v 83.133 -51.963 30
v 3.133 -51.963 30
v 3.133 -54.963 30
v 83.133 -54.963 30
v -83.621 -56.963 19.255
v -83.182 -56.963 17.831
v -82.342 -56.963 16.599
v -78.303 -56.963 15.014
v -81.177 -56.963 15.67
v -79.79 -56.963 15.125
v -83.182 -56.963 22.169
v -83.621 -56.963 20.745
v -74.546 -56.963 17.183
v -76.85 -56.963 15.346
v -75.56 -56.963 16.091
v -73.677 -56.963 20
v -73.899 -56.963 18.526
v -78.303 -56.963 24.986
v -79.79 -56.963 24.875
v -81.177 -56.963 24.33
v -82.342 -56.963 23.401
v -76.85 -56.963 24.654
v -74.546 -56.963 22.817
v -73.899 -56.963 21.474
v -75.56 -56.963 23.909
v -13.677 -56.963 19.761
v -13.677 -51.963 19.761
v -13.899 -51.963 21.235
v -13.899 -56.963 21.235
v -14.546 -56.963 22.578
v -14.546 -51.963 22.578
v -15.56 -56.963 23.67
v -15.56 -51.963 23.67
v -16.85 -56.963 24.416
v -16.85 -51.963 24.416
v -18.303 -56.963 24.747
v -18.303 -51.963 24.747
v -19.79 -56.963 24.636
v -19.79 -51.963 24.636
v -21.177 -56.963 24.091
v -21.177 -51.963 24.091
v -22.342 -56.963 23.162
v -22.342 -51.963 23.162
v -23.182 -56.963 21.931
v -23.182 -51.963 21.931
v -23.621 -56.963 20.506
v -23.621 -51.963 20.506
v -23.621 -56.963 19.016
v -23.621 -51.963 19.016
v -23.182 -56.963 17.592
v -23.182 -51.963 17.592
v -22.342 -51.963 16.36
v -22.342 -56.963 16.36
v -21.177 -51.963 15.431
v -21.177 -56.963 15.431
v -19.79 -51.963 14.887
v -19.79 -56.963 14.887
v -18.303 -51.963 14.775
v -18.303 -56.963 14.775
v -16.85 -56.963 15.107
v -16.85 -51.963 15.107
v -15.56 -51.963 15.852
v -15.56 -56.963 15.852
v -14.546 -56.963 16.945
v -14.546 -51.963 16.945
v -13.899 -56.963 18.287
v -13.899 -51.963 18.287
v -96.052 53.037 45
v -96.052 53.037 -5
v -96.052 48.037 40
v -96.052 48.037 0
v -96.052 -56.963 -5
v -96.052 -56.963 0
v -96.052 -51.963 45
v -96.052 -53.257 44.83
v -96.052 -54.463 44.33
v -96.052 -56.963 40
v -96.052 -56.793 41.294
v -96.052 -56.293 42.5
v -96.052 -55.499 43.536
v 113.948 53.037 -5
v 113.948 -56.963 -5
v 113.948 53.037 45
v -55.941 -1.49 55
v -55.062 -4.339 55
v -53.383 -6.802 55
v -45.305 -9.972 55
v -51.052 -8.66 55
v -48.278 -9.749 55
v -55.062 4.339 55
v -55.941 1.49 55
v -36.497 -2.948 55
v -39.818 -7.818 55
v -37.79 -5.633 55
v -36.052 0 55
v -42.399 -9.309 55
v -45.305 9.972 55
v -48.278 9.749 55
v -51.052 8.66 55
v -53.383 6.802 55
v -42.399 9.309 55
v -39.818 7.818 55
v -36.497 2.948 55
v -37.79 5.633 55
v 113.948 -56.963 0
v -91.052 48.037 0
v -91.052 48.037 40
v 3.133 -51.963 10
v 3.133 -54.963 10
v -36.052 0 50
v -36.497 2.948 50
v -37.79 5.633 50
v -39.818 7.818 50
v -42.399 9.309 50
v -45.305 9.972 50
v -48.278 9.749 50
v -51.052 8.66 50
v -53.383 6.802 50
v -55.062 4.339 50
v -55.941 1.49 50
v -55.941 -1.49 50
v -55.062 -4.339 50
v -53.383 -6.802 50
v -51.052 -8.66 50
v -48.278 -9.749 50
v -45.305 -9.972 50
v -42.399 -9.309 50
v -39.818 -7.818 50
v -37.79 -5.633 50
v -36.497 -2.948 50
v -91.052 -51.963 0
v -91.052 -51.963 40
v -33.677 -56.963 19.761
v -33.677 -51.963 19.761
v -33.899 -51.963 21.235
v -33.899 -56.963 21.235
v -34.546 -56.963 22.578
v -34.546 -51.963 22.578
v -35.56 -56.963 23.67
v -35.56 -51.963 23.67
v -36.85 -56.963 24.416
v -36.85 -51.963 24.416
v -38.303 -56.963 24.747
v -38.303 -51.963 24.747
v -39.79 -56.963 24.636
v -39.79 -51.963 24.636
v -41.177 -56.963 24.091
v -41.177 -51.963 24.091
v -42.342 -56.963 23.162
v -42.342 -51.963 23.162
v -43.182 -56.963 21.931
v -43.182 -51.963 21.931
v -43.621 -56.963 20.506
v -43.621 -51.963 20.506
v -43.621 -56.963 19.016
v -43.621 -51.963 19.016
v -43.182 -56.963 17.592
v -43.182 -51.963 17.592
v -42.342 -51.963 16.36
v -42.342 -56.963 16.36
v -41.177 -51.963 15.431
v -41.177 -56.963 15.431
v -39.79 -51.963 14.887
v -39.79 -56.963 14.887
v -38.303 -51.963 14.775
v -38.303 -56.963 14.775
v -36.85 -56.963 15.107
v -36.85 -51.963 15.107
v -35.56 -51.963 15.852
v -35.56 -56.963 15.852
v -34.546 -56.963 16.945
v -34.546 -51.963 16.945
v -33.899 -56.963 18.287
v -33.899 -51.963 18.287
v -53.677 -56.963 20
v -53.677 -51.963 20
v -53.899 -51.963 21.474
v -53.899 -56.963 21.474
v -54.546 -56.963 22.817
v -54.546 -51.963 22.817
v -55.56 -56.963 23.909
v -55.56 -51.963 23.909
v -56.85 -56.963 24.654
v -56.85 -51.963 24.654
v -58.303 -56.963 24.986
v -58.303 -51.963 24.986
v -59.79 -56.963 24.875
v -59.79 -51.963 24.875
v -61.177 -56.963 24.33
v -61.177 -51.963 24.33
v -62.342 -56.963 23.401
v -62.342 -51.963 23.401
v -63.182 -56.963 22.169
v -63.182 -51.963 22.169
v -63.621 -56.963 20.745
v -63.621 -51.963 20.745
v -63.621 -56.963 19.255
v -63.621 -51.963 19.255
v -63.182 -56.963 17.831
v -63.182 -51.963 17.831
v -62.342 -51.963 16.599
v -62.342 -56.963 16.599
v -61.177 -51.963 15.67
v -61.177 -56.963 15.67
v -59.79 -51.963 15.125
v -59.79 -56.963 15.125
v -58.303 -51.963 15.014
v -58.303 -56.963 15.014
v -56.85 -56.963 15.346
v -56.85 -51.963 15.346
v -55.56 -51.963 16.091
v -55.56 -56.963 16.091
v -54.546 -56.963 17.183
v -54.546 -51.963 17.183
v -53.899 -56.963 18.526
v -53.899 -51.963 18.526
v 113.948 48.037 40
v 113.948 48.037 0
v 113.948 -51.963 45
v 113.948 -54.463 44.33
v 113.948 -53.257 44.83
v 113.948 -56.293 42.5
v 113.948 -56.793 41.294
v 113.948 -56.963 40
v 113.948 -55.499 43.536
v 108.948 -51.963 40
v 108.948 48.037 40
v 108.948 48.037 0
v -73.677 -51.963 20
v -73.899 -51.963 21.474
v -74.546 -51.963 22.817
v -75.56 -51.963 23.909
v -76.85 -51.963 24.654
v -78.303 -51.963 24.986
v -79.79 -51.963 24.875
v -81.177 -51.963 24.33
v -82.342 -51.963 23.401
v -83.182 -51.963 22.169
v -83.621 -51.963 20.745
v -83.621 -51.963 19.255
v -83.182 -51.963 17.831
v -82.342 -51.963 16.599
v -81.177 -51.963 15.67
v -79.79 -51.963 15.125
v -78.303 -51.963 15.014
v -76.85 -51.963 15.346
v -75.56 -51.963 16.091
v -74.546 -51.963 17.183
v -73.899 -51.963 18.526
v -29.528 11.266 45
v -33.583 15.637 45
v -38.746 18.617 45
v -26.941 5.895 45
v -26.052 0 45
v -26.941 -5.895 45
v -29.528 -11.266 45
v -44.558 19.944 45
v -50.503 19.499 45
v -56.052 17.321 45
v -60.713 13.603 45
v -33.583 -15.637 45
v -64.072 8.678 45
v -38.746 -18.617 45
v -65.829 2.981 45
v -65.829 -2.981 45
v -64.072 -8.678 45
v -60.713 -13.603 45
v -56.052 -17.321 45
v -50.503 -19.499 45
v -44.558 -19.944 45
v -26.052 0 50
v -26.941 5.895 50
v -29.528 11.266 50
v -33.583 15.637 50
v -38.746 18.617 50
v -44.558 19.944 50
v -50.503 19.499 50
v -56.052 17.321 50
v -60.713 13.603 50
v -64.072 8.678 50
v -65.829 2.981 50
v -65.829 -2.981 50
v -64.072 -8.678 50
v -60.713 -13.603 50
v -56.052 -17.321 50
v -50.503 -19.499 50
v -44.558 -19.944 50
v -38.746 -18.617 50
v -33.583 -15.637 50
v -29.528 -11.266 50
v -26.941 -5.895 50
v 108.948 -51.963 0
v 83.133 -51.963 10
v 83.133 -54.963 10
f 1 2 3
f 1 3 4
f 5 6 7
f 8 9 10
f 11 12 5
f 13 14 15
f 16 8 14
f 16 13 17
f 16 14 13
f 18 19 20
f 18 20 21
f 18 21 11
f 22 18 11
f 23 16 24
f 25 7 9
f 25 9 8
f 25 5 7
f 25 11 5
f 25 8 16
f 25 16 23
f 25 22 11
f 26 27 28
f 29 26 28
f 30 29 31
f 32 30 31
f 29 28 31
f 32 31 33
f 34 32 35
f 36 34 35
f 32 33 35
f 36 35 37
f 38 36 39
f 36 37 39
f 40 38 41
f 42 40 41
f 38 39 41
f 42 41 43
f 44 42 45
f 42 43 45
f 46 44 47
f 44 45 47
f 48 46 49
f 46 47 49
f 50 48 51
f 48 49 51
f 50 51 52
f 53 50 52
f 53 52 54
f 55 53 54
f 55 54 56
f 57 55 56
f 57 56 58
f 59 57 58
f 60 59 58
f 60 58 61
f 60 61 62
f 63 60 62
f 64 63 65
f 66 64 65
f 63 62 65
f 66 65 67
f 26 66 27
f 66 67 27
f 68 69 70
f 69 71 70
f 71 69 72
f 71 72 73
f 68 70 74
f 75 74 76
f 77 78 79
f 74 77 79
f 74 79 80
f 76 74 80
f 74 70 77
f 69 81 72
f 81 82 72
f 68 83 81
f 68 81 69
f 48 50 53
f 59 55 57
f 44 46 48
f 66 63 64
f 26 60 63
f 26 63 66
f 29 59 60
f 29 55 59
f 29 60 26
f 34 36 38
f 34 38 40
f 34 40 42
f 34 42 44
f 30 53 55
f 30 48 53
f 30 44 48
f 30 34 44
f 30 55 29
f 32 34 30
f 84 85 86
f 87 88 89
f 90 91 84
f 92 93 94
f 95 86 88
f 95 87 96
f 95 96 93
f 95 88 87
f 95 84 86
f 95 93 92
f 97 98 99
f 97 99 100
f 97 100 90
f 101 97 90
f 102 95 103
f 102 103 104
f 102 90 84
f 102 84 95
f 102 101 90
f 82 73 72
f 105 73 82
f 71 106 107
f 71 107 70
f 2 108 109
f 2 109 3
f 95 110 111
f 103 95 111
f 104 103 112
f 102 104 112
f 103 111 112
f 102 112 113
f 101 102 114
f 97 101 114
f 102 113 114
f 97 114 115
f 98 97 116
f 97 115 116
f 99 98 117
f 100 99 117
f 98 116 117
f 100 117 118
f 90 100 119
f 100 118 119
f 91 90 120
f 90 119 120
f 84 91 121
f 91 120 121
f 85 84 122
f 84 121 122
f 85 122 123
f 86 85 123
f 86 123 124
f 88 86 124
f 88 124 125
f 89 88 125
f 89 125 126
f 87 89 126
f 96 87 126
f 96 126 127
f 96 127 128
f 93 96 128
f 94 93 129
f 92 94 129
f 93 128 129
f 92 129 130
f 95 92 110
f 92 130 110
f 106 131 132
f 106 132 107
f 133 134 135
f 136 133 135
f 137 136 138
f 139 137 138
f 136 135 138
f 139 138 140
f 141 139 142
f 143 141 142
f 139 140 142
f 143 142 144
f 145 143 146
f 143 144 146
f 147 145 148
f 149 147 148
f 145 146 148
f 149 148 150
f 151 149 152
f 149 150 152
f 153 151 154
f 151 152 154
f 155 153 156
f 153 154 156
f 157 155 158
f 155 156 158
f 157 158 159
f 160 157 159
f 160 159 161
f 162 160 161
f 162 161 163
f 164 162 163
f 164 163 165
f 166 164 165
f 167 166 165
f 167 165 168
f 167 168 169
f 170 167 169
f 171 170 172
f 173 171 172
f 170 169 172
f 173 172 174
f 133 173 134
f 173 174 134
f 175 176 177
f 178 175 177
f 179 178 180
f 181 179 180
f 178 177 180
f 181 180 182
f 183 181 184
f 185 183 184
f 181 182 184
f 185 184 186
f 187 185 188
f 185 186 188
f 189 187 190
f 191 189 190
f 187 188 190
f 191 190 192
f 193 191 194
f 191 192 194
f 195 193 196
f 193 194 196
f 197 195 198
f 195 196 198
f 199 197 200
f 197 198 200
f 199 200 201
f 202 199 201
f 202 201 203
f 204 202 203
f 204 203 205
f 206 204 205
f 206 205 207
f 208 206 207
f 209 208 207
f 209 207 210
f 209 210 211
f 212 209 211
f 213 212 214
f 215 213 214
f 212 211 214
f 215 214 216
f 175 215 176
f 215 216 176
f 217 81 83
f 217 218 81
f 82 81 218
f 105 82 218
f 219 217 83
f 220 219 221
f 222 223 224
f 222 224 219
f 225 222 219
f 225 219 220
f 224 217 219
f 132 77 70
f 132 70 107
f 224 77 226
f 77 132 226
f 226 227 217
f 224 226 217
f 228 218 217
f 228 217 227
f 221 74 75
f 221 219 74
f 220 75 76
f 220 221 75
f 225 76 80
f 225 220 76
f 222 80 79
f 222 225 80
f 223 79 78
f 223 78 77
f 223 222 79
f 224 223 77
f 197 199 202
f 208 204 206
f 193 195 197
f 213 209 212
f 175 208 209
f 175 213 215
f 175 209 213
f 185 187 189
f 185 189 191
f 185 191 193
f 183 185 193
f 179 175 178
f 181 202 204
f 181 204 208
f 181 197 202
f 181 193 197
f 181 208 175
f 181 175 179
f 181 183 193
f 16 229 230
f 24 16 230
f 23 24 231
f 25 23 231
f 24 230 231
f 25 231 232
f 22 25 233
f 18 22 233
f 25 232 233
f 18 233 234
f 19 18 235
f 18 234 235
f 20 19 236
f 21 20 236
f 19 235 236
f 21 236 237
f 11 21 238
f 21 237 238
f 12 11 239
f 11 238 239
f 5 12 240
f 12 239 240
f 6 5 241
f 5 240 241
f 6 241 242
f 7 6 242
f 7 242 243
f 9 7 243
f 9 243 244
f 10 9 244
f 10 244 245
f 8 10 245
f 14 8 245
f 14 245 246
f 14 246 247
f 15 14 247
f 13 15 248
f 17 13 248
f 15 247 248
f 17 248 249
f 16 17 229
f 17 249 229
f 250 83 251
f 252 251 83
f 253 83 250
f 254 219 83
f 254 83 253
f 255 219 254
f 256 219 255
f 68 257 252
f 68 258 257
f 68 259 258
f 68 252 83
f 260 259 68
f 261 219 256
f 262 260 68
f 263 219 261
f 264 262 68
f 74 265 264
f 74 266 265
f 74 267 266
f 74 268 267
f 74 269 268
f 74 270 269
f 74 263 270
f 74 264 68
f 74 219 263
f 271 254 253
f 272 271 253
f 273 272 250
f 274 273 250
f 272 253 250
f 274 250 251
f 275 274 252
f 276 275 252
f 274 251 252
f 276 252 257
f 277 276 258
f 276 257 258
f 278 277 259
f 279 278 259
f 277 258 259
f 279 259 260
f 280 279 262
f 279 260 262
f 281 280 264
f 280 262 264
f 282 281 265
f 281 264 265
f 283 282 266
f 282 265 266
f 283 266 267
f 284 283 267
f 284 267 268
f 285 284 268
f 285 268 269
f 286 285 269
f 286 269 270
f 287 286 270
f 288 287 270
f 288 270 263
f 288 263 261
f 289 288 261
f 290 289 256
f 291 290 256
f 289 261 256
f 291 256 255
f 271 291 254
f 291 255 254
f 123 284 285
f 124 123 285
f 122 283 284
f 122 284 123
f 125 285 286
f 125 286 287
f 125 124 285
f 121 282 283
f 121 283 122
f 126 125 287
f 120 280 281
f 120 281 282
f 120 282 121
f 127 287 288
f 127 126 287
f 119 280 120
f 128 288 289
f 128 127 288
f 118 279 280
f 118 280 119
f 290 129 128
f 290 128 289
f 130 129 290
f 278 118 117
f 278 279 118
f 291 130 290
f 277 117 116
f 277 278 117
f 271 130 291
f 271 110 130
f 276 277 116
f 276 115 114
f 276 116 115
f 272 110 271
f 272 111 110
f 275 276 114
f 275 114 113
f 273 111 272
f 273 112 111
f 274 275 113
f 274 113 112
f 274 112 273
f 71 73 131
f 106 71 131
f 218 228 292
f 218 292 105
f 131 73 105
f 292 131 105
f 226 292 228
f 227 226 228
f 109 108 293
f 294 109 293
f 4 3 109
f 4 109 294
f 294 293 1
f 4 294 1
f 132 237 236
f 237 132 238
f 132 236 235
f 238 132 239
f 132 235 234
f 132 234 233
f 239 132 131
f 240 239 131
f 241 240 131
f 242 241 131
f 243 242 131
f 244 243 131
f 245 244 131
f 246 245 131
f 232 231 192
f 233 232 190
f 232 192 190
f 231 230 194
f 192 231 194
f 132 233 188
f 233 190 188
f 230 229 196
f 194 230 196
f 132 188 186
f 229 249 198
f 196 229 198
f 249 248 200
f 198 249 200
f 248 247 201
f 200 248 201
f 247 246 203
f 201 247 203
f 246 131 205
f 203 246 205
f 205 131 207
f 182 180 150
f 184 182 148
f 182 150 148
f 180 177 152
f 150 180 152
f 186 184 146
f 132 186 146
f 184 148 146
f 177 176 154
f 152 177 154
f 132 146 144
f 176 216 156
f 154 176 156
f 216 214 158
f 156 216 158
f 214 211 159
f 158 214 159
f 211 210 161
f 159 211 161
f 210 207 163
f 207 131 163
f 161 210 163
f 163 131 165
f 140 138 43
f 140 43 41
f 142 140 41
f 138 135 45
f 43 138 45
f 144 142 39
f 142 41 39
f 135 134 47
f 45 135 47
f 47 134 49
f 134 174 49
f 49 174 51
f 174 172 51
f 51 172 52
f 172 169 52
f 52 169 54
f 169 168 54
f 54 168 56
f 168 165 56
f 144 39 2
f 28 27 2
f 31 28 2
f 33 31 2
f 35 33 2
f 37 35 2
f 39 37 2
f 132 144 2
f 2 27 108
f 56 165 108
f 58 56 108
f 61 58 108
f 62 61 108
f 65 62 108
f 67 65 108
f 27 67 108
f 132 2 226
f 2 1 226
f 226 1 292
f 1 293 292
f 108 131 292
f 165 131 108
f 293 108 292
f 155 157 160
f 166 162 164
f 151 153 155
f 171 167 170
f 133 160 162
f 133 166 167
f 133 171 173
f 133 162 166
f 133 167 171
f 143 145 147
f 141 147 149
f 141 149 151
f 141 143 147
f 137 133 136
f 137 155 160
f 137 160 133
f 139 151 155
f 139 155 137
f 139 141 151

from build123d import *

# Parameters (mm, degrees)
F0_W      = 200
F0_H      = 100
F1_DEPTH  = 40
F2_W      = 210
F2_H      = 105
F2_W_2    = 200
F2_H_2    = 100
F3_DEPTH  = 5
F4_W      = 210
F4_H      = 105
F5_DEPTH  = 5
F6_W      = 210
F6_H      = 50
F7_DEPTH  = 5
F8_R      = 20
F9_DEPTH  = 5
F10_R     = 10
F11_DEPTH = 5
F12_R     = 5
F13_DEPTH = 5
F14_DEPTH = 5
F15_DEPTH = 5
F16_DEPTH = 5
F12_W     = 80
F12_H     = 20
F17_DEPTH = 3
F18_R     = 4.99999


# Not quite as in the source:
# - a fillet or chamfer is up to 0.001 mm smaller than in the source, because OpenCascade refuses the exact size


with BuildPart() as f1:
    # F0 (on Top) → F1 (new body)
    with BuildSketch(Plane.XY):
        with Locations((8.9475423098, -1.9630908966)):
            Rectangle(F0_W, F0_H)
    extrude(amount=F1_DEPTH)

    # F2 (on face) → F3 (join)
    with BuildSketch(Plane.XY.offset(40)):
        Polygon((113.9475423098, -56.9630908966), (113.9475423098, 48.0369091034), (108.9475423098, 48.0369091034), (108.9475423098, -51.9630908966), (-91.0524576902, -51.9630908966), (-91.0524576902, 48.0369091034), (-96.0524576902, 48.0369091034), (-96.0524576902, -56.9630908966), align=None)
        with Locations((8.9475423098, -4.4630908966)):
            Rectangle(F2_W, F2_H)
        with Locations((8.9475423098, -1.9630908966)):
            Rectangle(F2_W_2, F2_H_2)
    extrude(amount=F3_DEPTH)

    # F4 (on face) → F5 (join)
    with BuildSketch(Plane(origin=(0, 0, 0), x_dir=(1, 0, 0), z_dir=(0, 0, -1))):
        with Locations((8.9475423098, 4.4630908966)):
            Rectangle(F4_W, F4_H)
    extrude(amount=F5_DEPTH)

    # F6 (on face) → F7 (join)
    with BuildSketch(Plane(origin=(0, 48.0369091034, 0), x_dir=(-1, 0, 0), z_dir=(0, 1, 0))):
        with Locations((-8.9475423098, 20)):
            Rectangle(F6_W, F6_H)
    extrude(amount=F7_DEPTH)

    # F8 (on face) → F9 (join)
    with BuildSketch(Plane.XY.offset(45)):
        with Locations((-46.0524576902, 0)):
            Circle(F8_R)
    extrude(amount=F9_DEPTH)

    # F10 (on face) → F11 (join)
    with BuildSketch(Plane.XY.offset(50)):
        with Locations((-46.0524576902, 0)):
            Circle(F10_R)
    extrude(amount=F11_DEPTH)

    # F12 (on face) → F13 (join)
    with BuildSketch(Plane.XZ.offset(51.9630908966)):
        with Locations((-78.6770284176, 20)):
            Circle(F12_R)
    extrude(amount=F13_DEPTH)

    # F12 (on face) → F14 (join)
    with BuildSketch(Plane.XZ.offset(51.9630908966)):
        with Locations((-58.6770284176, 20)):
            Circle(F12_R)
    extrude(amount=F14_DEPTH)

    # F12 (on face) → F15 (join)
    with BuildSketch(Plane.XZ.offset(51.9630908966)):
        with Locations((-38.6770284176, 19.7612177581)):
            Circle(F12_R)
    extrude(amount=F15_DEPTH)

    # F12 (on face) → F16 (join)
    with BuildSketch(Plane.XZ.offset(51.9630908966)):
        with Locations((-18.6770284176, 19.7612177581)):
            Circle(F12_R)
    extrude(amount=F16_DEPTH)

    # F12 (on face) → F17 (join)
    with BuildSketch(Plane.XZ.offset(51.9630908966)):
        with Locations((43.1329405028, 20)):
            Rectangle(F12_W, F12_H)
    extrude(amount=F17_DEPTH)

    # F18 (radius 5 in the source; OpenCascade refuses exactly that, so slightly less here)
    f18_edges = [f1.edges().sort_by_distance(p)[0] for p in [
        (8.947542, -56.963091, 45),
    ]]
    fillet(f18_edges, radius=F18_R)


solid = f1.part
